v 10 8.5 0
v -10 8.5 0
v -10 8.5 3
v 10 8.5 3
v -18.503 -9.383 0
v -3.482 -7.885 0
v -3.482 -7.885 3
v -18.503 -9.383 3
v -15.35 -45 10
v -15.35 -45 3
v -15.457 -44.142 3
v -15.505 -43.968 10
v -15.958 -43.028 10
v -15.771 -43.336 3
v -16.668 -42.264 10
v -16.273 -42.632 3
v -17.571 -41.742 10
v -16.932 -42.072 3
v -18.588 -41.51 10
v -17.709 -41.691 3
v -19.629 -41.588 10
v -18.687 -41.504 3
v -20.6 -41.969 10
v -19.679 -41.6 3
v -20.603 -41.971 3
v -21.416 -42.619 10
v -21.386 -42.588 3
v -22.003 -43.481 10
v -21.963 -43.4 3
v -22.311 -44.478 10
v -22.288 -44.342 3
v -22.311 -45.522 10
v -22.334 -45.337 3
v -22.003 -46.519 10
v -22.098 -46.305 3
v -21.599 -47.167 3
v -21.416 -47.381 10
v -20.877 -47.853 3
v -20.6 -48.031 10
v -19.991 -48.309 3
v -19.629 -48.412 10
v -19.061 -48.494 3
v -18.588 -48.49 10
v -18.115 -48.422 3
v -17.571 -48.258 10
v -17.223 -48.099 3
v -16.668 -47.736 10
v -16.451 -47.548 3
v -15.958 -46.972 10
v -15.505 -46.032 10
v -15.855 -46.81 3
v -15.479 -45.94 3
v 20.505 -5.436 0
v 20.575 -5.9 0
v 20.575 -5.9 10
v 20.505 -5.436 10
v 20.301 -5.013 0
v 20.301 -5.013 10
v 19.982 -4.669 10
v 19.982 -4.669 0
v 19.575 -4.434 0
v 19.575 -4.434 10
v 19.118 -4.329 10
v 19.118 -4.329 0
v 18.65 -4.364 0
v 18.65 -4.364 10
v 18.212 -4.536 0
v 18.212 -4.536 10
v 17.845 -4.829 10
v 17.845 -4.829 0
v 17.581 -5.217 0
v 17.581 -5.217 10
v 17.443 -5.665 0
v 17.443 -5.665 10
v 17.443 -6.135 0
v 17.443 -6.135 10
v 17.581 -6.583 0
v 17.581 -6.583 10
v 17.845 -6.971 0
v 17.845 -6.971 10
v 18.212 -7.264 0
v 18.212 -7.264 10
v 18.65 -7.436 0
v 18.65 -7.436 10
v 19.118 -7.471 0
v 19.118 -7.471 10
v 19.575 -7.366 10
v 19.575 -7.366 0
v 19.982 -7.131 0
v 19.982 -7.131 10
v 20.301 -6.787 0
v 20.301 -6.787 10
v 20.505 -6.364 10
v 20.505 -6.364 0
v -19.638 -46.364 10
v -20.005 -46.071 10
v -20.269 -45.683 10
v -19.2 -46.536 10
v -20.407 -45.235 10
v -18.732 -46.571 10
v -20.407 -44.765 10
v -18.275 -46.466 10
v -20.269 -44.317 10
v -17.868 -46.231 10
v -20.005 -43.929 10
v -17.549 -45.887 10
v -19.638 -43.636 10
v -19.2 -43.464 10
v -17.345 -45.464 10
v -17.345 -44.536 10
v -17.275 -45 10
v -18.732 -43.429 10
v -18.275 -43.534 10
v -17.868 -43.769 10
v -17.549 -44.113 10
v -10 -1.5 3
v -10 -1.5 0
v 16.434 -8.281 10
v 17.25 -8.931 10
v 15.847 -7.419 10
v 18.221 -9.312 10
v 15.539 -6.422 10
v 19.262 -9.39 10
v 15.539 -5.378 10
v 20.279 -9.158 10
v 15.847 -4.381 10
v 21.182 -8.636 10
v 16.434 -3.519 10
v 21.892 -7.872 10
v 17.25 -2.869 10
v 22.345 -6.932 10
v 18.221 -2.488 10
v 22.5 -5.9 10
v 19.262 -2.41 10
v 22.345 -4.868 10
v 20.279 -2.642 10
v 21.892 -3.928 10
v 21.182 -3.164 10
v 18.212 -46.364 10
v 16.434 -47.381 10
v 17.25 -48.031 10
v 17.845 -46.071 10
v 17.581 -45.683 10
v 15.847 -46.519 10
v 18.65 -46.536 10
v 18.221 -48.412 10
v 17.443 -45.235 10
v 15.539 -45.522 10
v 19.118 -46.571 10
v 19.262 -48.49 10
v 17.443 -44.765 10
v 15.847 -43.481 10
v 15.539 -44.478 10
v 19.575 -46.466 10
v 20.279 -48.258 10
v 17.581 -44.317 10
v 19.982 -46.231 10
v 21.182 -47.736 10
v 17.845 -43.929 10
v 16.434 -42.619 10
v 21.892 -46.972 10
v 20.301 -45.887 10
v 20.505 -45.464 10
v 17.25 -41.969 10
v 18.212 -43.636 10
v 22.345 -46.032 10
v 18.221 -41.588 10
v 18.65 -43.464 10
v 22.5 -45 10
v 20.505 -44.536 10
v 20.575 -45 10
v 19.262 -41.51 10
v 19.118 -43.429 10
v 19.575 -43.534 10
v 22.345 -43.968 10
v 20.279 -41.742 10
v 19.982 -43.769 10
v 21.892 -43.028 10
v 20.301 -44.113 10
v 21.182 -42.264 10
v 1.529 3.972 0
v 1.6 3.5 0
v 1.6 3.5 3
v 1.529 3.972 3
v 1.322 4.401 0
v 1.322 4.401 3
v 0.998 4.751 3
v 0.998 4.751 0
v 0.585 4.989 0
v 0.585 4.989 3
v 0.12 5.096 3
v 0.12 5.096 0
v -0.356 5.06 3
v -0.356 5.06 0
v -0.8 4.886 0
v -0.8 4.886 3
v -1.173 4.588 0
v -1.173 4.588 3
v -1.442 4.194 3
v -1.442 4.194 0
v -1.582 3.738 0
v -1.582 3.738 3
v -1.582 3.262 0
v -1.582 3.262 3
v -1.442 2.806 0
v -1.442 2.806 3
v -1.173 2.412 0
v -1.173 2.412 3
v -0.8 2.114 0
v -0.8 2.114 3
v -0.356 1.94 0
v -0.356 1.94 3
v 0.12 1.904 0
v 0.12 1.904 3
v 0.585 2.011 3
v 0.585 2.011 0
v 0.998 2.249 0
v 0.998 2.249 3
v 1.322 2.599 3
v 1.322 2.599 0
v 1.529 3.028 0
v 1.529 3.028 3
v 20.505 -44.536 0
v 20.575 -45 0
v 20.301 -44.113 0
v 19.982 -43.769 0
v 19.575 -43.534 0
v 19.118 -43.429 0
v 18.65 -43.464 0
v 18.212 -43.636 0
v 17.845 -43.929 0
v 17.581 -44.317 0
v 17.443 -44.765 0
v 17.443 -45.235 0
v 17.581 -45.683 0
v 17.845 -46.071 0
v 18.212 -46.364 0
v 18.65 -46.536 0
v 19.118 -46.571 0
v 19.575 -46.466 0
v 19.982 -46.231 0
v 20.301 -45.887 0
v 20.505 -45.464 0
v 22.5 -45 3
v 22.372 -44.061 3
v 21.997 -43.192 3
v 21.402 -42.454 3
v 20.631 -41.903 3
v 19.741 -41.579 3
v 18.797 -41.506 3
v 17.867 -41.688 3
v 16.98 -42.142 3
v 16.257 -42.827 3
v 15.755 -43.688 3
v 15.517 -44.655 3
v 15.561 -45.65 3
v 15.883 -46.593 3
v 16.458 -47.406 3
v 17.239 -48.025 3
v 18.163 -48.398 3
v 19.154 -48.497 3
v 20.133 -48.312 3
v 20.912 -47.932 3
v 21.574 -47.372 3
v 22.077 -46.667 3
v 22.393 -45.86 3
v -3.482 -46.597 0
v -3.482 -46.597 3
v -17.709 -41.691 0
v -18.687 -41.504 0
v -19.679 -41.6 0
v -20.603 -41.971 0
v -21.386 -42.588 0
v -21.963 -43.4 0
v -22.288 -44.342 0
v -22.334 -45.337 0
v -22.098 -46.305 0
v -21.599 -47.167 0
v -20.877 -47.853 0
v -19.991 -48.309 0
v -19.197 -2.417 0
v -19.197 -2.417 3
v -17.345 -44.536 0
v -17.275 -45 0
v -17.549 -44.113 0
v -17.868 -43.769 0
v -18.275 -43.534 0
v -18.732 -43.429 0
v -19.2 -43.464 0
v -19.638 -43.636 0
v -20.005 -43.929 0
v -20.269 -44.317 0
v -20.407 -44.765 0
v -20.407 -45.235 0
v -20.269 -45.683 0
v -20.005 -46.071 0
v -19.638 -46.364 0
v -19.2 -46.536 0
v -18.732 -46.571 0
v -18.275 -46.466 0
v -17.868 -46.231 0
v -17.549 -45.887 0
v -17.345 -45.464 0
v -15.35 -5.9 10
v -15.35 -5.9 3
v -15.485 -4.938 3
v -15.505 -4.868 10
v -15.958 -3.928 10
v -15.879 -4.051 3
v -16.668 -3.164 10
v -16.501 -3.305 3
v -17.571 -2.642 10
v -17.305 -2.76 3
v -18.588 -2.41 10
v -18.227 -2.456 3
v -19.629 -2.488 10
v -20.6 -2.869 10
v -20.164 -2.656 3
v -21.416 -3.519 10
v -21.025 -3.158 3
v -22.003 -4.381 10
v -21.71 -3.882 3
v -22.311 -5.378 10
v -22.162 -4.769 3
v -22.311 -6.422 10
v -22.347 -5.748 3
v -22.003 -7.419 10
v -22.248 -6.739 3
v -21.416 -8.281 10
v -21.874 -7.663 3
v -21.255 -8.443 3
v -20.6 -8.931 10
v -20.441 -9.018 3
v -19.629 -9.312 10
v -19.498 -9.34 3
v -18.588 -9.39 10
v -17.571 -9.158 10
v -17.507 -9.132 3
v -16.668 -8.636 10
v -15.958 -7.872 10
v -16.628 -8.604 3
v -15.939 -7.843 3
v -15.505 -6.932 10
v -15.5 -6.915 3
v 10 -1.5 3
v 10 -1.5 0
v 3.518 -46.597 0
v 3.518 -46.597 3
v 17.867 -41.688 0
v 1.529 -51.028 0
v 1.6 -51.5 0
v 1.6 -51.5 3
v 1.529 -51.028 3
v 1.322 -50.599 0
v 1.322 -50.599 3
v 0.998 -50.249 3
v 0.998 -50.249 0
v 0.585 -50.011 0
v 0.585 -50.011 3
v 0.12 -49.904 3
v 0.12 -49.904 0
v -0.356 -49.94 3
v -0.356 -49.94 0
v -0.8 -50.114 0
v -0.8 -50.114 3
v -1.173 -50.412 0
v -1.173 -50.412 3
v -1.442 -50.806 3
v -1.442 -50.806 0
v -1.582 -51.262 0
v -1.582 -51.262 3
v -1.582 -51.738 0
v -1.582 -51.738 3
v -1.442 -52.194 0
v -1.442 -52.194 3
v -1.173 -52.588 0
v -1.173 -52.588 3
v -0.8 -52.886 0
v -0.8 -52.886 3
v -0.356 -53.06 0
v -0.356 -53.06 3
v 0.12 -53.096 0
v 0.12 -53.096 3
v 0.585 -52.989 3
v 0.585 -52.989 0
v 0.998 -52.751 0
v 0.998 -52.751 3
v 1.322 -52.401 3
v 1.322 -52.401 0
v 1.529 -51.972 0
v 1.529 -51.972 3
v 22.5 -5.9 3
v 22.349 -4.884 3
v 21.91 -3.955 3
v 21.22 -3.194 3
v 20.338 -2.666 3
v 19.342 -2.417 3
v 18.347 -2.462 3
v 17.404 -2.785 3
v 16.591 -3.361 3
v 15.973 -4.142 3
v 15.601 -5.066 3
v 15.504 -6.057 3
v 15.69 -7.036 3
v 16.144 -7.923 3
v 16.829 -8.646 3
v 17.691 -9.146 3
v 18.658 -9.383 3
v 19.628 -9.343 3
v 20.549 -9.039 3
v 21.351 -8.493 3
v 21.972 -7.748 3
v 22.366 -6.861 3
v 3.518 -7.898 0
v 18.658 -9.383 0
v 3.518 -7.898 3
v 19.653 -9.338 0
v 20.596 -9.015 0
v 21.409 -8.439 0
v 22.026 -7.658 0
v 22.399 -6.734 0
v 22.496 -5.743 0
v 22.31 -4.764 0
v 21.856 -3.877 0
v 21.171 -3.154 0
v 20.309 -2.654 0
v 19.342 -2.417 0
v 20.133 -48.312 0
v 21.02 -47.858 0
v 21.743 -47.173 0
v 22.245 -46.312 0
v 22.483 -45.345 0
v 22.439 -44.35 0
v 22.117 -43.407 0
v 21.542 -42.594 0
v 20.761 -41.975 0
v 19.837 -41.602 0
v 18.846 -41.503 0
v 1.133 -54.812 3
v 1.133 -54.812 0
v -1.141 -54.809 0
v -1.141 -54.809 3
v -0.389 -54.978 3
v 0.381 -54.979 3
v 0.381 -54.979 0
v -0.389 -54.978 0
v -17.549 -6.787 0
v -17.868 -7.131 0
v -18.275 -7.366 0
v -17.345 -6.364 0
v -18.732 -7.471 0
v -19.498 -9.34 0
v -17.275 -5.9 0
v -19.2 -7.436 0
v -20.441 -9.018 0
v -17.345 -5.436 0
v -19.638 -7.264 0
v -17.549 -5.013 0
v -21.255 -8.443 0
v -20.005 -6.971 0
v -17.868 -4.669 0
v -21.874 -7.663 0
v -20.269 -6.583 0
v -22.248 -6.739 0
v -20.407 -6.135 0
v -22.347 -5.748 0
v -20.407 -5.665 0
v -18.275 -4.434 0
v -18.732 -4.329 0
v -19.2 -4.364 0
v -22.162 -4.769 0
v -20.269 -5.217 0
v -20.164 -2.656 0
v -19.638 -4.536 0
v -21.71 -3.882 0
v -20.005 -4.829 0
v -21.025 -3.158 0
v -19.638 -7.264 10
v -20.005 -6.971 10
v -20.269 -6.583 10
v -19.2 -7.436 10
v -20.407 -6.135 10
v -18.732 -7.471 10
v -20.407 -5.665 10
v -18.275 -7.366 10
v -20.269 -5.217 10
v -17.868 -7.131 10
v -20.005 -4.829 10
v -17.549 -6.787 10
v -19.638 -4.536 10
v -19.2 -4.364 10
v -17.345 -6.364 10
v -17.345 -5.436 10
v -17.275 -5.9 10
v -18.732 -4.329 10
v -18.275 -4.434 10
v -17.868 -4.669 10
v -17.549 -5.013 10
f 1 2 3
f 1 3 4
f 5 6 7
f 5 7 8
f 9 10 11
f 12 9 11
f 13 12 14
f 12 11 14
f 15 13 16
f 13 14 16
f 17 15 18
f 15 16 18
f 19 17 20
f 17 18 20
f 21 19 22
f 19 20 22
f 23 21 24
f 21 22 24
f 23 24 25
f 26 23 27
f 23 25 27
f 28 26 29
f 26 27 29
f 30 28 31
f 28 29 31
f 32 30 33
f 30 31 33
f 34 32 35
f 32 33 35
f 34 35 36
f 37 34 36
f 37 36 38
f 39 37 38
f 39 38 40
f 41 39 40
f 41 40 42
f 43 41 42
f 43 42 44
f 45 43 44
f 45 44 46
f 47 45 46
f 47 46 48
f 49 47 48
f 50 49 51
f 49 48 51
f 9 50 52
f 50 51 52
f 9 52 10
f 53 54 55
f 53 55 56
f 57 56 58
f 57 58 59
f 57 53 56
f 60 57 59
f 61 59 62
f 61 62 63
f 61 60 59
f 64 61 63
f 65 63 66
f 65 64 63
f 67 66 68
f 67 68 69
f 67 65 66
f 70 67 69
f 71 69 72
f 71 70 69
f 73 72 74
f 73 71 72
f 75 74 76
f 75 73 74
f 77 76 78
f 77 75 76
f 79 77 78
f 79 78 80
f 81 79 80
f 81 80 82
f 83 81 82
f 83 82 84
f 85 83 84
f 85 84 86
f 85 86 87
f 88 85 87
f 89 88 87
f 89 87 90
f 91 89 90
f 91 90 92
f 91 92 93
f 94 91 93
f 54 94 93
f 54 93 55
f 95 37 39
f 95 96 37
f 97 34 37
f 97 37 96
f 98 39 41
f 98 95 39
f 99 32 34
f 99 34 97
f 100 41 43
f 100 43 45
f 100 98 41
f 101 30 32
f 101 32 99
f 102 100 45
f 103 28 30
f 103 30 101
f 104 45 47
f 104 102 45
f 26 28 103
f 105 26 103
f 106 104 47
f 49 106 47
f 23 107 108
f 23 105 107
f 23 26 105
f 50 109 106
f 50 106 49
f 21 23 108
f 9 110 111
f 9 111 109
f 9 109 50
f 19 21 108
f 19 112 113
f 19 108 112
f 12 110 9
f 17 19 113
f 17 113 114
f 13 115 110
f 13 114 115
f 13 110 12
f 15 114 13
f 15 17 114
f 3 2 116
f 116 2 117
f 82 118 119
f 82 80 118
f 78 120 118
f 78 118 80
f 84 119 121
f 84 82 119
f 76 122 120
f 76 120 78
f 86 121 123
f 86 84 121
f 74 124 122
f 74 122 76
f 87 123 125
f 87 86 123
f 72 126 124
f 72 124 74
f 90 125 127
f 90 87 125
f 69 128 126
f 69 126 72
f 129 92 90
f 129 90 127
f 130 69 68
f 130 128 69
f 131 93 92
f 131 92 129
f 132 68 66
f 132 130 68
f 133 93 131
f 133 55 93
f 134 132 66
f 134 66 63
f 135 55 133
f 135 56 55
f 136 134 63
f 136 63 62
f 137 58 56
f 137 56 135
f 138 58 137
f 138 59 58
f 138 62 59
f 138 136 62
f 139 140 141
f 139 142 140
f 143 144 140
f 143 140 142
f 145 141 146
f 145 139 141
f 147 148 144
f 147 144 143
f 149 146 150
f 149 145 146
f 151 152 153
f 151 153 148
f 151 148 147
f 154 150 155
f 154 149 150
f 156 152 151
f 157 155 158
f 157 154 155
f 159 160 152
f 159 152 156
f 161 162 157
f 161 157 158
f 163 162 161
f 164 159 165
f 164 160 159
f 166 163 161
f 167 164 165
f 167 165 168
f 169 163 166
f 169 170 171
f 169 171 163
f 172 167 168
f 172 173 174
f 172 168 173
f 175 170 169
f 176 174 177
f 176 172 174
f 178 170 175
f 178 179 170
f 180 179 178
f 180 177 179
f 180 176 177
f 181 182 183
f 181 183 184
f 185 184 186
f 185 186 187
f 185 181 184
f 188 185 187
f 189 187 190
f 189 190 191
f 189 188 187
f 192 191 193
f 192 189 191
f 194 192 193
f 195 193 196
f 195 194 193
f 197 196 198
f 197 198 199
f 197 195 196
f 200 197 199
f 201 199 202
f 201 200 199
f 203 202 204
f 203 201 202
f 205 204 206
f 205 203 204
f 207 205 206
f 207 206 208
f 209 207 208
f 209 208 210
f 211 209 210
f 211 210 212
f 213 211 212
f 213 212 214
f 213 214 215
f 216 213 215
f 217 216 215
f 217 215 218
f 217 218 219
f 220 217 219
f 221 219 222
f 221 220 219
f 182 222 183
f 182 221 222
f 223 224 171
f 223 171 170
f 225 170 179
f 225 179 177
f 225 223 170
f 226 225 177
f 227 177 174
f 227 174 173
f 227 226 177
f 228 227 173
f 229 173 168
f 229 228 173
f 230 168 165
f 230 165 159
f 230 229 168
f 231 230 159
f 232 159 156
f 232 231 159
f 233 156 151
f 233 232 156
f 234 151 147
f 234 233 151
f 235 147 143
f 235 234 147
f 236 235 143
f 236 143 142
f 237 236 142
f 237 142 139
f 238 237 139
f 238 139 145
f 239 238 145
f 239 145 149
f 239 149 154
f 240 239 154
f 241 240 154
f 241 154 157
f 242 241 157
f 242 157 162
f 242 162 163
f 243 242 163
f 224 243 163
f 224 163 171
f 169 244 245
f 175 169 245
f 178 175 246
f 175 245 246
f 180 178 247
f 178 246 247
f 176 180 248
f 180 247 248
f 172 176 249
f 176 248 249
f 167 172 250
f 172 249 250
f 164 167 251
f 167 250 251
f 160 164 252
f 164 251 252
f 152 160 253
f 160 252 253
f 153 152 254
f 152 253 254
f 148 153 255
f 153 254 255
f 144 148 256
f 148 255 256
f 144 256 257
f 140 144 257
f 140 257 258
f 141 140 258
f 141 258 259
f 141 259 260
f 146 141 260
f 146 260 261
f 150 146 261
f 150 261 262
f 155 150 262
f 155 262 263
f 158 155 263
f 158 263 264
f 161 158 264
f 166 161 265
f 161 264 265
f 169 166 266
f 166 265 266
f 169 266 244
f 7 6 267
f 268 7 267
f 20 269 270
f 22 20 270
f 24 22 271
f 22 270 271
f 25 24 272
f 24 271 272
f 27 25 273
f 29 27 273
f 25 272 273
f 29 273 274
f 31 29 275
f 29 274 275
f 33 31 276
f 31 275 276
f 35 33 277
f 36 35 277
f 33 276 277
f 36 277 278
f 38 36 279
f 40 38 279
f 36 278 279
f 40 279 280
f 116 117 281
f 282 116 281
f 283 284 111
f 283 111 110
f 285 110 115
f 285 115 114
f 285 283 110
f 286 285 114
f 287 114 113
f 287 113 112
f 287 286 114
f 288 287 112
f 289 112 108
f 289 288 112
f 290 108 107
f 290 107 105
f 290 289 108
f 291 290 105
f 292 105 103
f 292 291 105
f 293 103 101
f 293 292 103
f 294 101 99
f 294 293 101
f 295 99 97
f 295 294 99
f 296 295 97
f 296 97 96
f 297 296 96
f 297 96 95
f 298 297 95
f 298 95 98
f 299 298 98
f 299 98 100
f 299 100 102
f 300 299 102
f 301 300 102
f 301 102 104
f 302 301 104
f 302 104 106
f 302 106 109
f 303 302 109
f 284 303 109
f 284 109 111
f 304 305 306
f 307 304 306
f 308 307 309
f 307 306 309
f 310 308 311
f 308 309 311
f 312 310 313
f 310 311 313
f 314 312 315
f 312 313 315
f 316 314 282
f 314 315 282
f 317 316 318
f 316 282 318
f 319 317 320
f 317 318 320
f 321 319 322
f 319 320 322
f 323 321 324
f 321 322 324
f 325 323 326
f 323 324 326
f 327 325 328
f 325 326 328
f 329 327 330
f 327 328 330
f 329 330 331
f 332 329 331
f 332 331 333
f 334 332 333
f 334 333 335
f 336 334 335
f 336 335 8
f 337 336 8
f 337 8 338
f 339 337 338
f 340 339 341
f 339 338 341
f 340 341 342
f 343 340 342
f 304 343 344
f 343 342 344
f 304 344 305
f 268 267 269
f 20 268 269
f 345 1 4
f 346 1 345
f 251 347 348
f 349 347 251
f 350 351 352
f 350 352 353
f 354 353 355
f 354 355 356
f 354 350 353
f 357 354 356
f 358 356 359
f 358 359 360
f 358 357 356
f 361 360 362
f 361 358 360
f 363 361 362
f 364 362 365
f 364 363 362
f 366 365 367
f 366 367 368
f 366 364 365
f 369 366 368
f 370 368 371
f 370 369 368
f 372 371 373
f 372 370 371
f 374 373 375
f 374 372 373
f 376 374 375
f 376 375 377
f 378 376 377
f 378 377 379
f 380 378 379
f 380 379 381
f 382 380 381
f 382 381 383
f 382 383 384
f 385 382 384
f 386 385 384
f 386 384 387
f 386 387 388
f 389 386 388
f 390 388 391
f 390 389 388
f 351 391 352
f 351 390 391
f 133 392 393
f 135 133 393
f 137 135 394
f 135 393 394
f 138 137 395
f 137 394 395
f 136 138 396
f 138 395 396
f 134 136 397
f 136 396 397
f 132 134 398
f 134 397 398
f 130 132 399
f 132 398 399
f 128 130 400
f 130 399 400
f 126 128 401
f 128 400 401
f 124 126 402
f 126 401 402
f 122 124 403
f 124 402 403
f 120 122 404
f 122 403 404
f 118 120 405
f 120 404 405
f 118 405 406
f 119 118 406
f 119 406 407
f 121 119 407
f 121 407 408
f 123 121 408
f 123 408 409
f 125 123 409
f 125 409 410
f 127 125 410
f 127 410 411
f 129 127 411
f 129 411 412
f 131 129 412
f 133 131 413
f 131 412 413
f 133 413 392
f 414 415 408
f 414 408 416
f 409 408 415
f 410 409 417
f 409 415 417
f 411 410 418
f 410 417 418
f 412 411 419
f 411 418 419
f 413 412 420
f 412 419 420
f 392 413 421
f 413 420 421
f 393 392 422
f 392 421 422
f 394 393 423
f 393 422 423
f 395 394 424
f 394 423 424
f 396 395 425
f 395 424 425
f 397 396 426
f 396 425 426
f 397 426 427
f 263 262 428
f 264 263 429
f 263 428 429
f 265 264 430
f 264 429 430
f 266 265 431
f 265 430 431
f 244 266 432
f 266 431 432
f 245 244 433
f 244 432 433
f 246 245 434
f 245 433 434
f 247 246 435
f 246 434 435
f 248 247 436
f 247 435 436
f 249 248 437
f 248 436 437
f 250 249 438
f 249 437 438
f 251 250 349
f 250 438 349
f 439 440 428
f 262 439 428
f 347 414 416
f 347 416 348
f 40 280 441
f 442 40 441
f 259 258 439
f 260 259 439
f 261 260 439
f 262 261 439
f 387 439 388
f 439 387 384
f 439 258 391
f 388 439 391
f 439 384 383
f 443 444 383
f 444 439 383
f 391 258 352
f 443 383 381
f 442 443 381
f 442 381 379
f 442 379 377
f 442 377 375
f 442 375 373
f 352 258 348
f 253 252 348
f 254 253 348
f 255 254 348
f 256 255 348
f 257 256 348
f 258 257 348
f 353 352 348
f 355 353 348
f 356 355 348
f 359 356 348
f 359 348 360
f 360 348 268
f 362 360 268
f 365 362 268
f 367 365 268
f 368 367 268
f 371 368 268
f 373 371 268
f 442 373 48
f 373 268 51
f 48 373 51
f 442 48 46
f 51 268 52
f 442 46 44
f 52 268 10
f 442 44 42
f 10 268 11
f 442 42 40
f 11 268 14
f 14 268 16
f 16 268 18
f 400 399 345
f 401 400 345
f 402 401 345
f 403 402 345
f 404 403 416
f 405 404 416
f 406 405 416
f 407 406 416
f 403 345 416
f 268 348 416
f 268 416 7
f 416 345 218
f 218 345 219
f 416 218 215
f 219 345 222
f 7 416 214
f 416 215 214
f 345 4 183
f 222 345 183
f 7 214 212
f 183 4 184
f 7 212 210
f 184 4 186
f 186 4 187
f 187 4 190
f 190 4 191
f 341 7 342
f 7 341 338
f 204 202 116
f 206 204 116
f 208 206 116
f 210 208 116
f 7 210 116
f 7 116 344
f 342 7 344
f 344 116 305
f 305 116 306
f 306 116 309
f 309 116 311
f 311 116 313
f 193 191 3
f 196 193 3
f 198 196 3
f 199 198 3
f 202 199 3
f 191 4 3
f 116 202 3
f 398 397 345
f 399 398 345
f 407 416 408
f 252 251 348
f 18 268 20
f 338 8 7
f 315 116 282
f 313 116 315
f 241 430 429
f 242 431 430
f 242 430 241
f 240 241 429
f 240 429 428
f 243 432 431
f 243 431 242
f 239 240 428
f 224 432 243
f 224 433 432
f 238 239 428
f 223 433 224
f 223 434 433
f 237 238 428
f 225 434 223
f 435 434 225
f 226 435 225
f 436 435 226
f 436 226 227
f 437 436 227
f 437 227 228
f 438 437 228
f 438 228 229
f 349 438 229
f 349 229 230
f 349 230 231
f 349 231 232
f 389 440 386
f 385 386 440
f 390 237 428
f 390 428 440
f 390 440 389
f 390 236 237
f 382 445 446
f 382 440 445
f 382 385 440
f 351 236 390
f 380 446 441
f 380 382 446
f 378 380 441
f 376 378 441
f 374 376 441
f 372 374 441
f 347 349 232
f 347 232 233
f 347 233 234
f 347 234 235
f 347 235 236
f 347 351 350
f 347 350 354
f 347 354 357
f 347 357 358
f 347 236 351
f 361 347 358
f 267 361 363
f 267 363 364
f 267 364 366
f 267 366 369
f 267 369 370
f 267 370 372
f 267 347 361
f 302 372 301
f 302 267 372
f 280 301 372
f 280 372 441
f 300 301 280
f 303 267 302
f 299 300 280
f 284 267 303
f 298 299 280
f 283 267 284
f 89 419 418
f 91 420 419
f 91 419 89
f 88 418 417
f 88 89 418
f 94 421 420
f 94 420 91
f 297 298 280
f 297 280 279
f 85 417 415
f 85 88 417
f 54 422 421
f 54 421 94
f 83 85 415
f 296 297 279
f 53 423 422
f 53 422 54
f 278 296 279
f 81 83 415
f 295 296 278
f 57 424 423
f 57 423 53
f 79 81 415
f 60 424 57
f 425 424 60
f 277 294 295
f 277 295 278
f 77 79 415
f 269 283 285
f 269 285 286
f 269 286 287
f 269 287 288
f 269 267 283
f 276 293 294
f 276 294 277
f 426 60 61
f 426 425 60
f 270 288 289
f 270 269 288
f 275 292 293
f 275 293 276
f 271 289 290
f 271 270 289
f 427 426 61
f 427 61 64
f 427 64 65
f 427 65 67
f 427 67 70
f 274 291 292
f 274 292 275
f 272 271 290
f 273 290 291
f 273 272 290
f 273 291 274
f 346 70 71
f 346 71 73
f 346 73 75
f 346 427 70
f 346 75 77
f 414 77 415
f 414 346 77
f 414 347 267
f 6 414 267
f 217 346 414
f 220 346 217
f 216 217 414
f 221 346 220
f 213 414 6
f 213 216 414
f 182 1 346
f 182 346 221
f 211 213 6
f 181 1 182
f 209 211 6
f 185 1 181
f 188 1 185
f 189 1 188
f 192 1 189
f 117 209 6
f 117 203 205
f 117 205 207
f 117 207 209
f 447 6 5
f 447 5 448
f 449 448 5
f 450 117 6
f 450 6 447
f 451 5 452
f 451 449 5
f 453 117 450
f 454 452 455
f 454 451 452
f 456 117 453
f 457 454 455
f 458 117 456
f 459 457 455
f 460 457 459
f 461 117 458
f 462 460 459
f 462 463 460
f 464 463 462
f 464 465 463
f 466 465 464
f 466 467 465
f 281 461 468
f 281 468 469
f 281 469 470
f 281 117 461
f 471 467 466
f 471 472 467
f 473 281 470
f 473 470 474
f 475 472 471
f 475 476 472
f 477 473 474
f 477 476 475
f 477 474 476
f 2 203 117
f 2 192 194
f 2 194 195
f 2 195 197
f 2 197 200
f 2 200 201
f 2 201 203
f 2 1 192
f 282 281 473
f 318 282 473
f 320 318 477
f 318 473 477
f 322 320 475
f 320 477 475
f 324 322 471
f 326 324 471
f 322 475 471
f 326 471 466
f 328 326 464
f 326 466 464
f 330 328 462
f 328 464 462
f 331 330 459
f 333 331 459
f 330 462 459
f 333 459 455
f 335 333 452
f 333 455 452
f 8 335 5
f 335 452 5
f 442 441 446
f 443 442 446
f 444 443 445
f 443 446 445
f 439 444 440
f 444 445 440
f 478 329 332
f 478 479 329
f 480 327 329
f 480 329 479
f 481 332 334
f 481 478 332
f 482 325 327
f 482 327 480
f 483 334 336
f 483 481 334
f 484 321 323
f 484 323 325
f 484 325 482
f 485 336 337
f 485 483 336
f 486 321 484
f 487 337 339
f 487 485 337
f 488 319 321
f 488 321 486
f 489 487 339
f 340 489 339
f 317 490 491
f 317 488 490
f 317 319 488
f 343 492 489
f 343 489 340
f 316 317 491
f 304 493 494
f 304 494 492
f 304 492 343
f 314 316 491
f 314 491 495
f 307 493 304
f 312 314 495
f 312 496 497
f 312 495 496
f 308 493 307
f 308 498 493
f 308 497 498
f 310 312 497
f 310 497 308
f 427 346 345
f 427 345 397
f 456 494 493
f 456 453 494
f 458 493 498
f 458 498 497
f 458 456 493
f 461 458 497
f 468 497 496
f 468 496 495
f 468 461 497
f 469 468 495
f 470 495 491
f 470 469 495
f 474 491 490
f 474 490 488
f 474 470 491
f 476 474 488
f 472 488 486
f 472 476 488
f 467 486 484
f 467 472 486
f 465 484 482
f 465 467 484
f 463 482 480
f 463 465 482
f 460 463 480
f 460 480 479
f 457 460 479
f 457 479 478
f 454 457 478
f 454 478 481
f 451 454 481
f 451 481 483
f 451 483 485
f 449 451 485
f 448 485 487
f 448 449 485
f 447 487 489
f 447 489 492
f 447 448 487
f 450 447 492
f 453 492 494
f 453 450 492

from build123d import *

# Parameters (mm, degrees)
SKETCH_R      = 1.575
SKETCH_R_2    = 1.6
PAD_DEPTH     = 3
SKETCH001_R   = 3.5
SKETCH001_R_2 = 1.575
PAD001_DEPTH  = 7


with BuildPart() as part:
    # Sketch → Pad (new body)
    with BuildSketch(Plane.XY):
        with BuildLine():
            Line((-10, 8.5), (10, 8.5))
            Line((10, 8.5), (10, -1.5))
            Line((10, -1.5), (19.3418018487, -2.4167297699))
            ThreePointArc((18.6581766844, -9.3832681236), (22.4832691769, -6.2418125822), (19.3418018487, -2.4167297699))
            Line((18.6581766844, -9.3832681236), (3.5183762437, -7.897569112))
            Line((3.5183762437, -7.897569112), (3.5183762437, -46.5971976167))
            Line((3.5183762437, -46.5971976167), (17.867093033, -41.6884260835))
            ThreePointArc((20.1329069981, -48.3115739058), (22.3115739111, -43.8670930175), (17.867093033, -41.6884260835))
            Line((1.1329067211, -54.8115740006), (20.1329069981, -48.3115739058))
            ThreePointArc((-1.1409673211, -54.80880546), (-0.0042613991, -54.9999974058), (1.1329067211, -54.8115740006))
            Line((-19.9909670183, -48.3088055644), (-1.1409673211, -54.80880546))
            ThreePointArc((-17.7090326253, -41.6911945585), (-22.158805503, -43.8590328035), (-19.9909670183, -48.3088055644))
            Line((-3.4816237563, -46.5971976167), (-17.7090326253, -41.6911945585))
            Line((-3.4816237563, -7.8846304044), (-3.4816237563, -46.5971976167))
            Line((-3.4816237563, -7.8846304044), (-18.5026576912, -9.3827221136))
            ThreePointArc((-19.1973406361, -2.4172777196), (-22.332722197, -6.2473414725), (-18.5026576912, -9.3827221136))
            Line((-10, -1.5), (-19.1973406361, -2.4172777196))
            Line((-10, 8.5), (-10, -1.5))
        make_face()
        with Locations((-18.85, -45)):
            Circle(SKETCH_R, mode=Mode.SUBTRACT)
        with Locations((19, -45)):
            Circle(SKETCH_R, mode=Mode.SUBTRACT)
        with Locations((0, -51.5)):
            Circle(SKETCH_R_2, mode=Mode.SUBTRACT)
        with Locations((0, 3.5)):
            Circle(SKETCH_R_2, mode=Mode.SUBTRACT)
        with Locations((-18.85, -5.9)):
            Circle(SKETCH_R, mode=Mode.SUBTRACT)
        with Locations((19, -5.9)):
            Circle(SKETCH_R, mode=Mode.SUBTRACT)
    extrude(amount=PAD_DEPTH)

    # Sketch001 → Pad001 (new body)
    with BuildSketch(Plane.XY.offset(3)):
        with Locations((-18.85, -5.9)):
            Circle(SKETCH001_R)
        with Locations((-18.85, -5.9)):
            Circle(SKETCH001_R_2, mode=Mode.SUBTRACT)
        with Locations((19, -5.9)):
            Circle(SKETCH001_R)
        with Locations((19, -5.9)):
            Circle(SKETCH001_R_2, mode=Mode.SUBTRACT)
        with Locations((19, -45)):
            Circle(SKETCH001_R)
        with Locations((19, -45)):
            Circle(SKETCH001_R_2, mode=Mode.SUBTRACT)
        with Locations((-18.85, -45)):
            Circle(SKETCH001_R)
        with Locations((-18.85, -45)):
            Circle(SKETCH001_R_2, mode=Mode.SUBTRACT)
    extrude(amount=PAD001_DEPTH)


solid = part.part
